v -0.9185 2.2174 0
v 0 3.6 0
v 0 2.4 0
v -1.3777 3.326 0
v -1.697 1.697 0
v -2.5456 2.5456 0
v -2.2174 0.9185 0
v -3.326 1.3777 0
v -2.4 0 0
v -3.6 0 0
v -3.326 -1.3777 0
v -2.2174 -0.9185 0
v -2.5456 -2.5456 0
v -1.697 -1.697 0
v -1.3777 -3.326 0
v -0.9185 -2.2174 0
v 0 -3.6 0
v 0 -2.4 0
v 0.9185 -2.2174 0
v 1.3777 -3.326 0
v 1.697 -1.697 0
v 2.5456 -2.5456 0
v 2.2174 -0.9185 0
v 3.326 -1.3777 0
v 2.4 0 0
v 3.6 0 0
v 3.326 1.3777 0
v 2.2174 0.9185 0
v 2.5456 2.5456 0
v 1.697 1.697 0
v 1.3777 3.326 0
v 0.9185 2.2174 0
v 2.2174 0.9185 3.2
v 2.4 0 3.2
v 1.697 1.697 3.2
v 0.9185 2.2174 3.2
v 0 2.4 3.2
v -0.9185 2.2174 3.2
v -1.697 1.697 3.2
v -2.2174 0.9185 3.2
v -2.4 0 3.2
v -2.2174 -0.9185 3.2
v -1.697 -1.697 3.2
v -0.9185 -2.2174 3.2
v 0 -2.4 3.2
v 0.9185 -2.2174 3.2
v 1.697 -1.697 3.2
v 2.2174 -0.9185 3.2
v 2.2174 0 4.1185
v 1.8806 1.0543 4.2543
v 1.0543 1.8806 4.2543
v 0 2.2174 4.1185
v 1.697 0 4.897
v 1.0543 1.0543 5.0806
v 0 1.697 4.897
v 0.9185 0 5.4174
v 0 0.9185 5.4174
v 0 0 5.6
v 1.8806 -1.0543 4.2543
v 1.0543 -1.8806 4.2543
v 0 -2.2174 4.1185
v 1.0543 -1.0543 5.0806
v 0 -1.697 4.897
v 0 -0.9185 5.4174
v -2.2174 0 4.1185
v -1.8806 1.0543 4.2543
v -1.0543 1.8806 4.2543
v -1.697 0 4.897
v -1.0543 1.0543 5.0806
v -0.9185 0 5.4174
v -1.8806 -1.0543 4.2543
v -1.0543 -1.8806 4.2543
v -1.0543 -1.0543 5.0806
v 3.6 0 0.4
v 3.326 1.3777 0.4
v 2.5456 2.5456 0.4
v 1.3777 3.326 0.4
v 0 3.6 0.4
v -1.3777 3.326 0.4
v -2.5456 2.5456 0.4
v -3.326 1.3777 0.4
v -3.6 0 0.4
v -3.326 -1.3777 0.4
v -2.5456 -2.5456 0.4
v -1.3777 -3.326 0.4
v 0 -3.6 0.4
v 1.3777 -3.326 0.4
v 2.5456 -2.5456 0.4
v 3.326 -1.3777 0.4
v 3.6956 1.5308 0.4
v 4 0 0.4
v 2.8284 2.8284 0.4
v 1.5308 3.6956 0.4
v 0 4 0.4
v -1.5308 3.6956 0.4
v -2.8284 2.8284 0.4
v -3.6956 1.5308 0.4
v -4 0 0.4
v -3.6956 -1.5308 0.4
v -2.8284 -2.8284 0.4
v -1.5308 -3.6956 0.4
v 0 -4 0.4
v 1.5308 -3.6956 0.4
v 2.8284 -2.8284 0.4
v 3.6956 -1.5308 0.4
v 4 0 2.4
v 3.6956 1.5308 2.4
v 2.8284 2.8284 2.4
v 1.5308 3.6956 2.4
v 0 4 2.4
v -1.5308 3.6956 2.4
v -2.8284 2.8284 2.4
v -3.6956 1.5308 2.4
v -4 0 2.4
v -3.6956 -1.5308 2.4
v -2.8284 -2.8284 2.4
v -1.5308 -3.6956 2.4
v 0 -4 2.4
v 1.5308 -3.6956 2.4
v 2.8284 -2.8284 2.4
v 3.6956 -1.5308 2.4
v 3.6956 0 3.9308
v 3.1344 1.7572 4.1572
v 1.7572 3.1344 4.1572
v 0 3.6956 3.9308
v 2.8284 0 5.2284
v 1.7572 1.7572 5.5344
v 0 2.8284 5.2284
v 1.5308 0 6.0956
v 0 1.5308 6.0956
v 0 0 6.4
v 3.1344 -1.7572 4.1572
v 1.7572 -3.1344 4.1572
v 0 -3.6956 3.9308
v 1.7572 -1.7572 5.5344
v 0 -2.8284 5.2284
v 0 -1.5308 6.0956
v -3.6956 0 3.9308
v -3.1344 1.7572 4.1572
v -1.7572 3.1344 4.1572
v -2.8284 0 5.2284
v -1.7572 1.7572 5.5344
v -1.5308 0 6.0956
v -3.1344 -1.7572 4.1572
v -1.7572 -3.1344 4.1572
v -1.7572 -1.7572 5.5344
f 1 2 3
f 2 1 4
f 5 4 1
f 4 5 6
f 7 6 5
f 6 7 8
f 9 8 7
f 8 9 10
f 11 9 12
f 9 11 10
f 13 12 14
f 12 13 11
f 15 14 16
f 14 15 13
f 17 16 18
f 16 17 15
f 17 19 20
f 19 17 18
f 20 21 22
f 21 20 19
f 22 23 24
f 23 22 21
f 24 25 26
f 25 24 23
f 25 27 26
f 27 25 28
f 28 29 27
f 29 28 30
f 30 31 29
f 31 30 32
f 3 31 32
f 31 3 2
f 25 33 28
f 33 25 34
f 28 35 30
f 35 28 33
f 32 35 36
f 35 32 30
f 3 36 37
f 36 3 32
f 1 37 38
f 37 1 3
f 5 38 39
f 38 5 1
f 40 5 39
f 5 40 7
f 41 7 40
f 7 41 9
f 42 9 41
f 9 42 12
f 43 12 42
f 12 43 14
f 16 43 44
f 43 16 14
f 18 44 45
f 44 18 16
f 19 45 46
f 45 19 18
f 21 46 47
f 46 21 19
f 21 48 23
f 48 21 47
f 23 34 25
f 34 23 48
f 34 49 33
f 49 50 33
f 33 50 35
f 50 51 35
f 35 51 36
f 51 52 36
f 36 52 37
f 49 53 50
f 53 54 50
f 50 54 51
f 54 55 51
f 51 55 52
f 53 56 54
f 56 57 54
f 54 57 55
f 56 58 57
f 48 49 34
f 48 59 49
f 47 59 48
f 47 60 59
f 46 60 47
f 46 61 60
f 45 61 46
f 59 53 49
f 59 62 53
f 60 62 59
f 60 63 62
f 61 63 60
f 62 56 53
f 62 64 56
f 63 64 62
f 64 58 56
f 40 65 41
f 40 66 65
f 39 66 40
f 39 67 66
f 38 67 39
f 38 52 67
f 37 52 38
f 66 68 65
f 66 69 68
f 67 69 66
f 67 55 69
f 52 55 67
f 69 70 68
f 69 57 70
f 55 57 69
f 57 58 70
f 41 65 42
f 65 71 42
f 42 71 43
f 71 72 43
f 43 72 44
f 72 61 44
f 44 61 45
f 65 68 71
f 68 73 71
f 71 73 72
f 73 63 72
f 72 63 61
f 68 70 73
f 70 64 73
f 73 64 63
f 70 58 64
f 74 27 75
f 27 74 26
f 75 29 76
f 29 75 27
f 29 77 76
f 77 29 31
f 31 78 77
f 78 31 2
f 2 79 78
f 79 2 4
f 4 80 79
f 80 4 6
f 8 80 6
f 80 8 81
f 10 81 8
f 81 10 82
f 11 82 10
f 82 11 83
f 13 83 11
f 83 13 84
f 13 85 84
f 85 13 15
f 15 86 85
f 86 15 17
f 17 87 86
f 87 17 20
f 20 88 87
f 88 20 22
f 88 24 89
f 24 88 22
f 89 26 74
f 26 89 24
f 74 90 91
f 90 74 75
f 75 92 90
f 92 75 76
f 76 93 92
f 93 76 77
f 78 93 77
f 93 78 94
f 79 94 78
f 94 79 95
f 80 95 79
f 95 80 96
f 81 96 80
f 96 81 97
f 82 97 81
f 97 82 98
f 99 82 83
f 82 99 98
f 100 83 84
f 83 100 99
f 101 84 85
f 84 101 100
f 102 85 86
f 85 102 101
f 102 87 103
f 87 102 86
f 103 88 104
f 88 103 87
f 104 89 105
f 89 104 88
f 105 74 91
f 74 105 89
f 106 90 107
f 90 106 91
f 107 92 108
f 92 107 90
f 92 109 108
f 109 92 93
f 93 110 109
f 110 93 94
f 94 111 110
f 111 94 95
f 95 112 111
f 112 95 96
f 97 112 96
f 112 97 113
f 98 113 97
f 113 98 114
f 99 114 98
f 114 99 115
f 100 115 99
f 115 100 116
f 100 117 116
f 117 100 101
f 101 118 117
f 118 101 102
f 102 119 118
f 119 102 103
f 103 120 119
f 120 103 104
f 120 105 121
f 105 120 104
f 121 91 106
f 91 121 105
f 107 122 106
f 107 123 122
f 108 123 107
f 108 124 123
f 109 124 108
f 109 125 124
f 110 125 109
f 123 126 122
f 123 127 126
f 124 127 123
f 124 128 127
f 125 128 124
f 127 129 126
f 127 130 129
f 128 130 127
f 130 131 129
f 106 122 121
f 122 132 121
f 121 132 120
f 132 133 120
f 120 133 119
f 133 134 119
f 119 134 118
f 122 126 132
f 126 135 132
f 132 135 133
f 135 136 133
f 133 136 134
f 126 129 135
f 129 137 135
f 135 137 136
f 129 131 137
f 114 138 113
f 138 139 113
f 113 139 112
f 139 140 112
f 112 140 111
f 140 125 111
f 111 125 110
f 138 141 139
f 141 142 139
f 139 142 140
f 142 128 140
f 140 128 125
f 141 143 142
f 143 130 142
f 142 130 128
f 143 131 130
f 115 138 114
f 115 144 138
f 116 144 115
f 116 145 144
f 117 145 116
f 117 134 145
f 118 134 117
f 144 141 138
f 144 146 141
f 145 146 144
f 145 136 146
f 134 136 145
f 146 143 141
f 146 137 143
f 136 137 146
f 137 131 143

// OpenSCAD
// file: ../p/1-8sphe.scad
use <../lib.scad>
function ldraw_lib__1_8sphe() = [
// 0 Sphere 0.125
// 0 Name: 1-8sphe.dat
// 0 Author: James Jessiman
// 0 !LDRAW_ORG Primitive UPDATE 2012-03
// 0 !LICENSE Licensed under CC BY 4.0 : see CAreadme.txt
// 
// 0 BFC CERTIFY CCW
  [0,"BFC","CERTIFY"],
  [0,"BFC","CCW"],
// 
// 0 !HISTORY 2000-08-01 {Axel Poque} fixes to resolve L3P error messages.
// 0 !HISTORY 2000-08-01 {Manfred Moolhuysen} fixes to resolve L3P error messages.
// 0 !HISTORY 2000-09-30 [PTadmin] Official Update 2000-02
// 0 !HISTORY 2002-03-28 [hafhead] Made BFC compliant
// 0 !HISTORY 2002-04-25 [PTadmin] Official Update 2002-02
// 0 !HISTORY 2007-06-22 [PTadmin] Header formatted for Contributor Agreement
// 0 !HISTORY 2008-07-01 [PTadmin] Official Update 2008-01
// 0 !HISTORY 2010-09-12 [MagFors] Changed winding, removed duplicated cond-line, optimized filesize
// 0 !HISTORY 2010-12-31 [PTadmin] Official Update 2010-03
// 0 !HISTORY 2012-07-01 [tcobbs] Replaced with geometry from LDView
// 0 !HISTORY 2012-12-28 [PTadmin] Official Update 2012-03
// 
// 
// 3 16 1 0 0 0.9239 0.3827 0 0.9239 0 0.3827
  [3,16,1,0,0,0.9239,0.3827,0,0.9239,0,0.3827],
// 3 16 0.9239 0.3827 0 0.7836 0.4393 0.4393 0.9239 0 0.3827
  [3,16,0.9239,0.3827,0,0.7836,0.4393,0.4393,0.9239,0,0.3827],
// 3 16 0.9239 0 0.3827 0.7836 0.4393 0.4393 0.7071 0 0.7071
  [3,16,0.9239,0,0.3827,0.7836,0.4393,0.4393,0.7071,0,0.7071],
// 3 16 0.7836 0.4393 0.4393 0.4393 0.4393 0.7836 0.7071 0 0.7071
  [3,16,0.7836,0.4393,0.4393,0.4393,0.4393,0.7836,0.7071,0,0.7071],
// 3 16 0.7071 0 0.7071 0.4393 0.4393 0.7836 0.3827 0 0.9239
  [3,16,0.7071,0,0.7071,0.4393,0.4393,0.7836,0.3827,0,0.9239],
// 3 16 0.4393 0.4393 0.7836 0 0.3827 0.9239 0.3827 0 0.9239
  [3,16,0.4393,0.4393,0.7836,0,0.3827,0.9239,0.3827,0,0.9239],
// 3 16 0.3827 0 0.9239 0 0.3827 0.9239 0 0 1
  [3,16,0.3827,0,0.9239,0,0.3827,0.9239,0,0,1],
// 3 16 0.9239 0.3827 0 0.7071 0.7071 0 0.7836 0.4393 0.4393
  [3,16,0.9239,0.3827,0,0.7071,0.7071,0,0.7836,0.4393,0.4393],
// 3 16 0.7071 0.7071 0 0.4393 0.7836 0.4393 0.7836 0.4393 0.4393
  [3,16,0.7071,0.7071,0,0.4393,0.7836,0.4393,0.7836,0.4393,0.4393],
// 3 16 0.7836 0.4393 0.4393 0.4393 0.7836 0.4393 0.4393 0.4393 0.7836
  [3,16,0.7836,0.4393,0.4393,0.4393,0.7836,0.4393,0.4393,0.4393,0.7836],
// 3 16 0.4393 0.7836 0.4393 0 0.7071 0.7071 0.4393 0.4393 0.7836
  [3,16,0.4393,0.7836,0.4393,0,0.7071,0.7071,0.4393,0.4393,0.7836],
// 3 16 0.4393 0.4393 0.7836 0 0.7071 0.7071 0 0.3827 0.9239
  [3,16,0.4393,0.4393,0.7836,0,0.7071,0.7071,0,0.3827,0.9239],
// 3 16 0.7071 0.7071 0 0.3827 0.9239 0 0.4393 0.7836 0.4393
  [3,16,0.7071,0.7071,0,0.3827,0.9239,0,0.4393,0.7836,0.4393],
// 3 16 0.3827 0.9239 0 0 0.9239 0.3827 0.4393 0.7836 0.4393
  [3,16,0.3827,0.9239,0,0,0.9239,0.3827,0.4393,0.7836,0.4393],
// 3 16 0.4393 0.7836 0.4393 0 0.9239 0.3827 0 0.7071 0.7071
  [3,16,0.4393,0.7836,0.4393,0,0.9239,0.3827,0,0.7071,0.7071],
// 3 16 0.3827 0.9239 0 0 1 0 0 0.9239 0.3827
  [3,16,0.3827,0.9239,0,0,1,0,0,0.9239,0.3827],
// 
// 5 24 1 0 0 0.9239 0.3827 0 1 0 -0.1 0.9239 0 0.3827
  [5,24,1,0,0,0.9239,0.3827,0,1,0,-0.1,0.9239,0,0.3827],
// 5 24 0.9239 0.3827 0 0.9239 0 0.3827 1 0 0 0.7836 0.4393 0.4393
  [5,24,0.9239,0.3827,0,0.9239,0,0.3827,1,0,0,0.7836,0.4393,0.4393],
// 5 24 1 0 0 0.9239 0 0.3827 0.9239 0.3827 0 1 -0.1 0
  [5,24,1,0,0,0.9239,0,0.3827,0.9239,0.3827,0,1,-0.1,0],
// 5 24 0.9239 0 0.3827 0.7836 0.4393 0.4393 0.9239 0.3827 0 0.7071 0 0.7071
  [5,24,0.9239,0,0.3827,0.7836,0.4393,0.4393,0.9239,0.3827,0,0.7071,0,0.7071],
// 5 24 0.7836 0.4393 0.4393 0.7071 0 0.7071 0.9239 0 0.3827 0.4393 0.4393 0.7836
  [5,24,0.7836,0.4393,0.4393,0.7071,0,0.7071,0.9239,0,0.3827,0.4393,0.4393,0.7836],
// 5 24 0.9239 0 0.3827 0.7071 0 0.7071 0.7836 0.4393 0.4393 0.9239 -0.1 0.3827
  [5,24,0.9239,0,0.3827,0.7071,0,0.7071,0.7836,0.4393,0.4393,0.9239,-0.1,0.3827],
// 5 24 0.7071 0 0.7071 0.4393 0.4393 0.7836 0.7836 0.4393 0.4393 0.3827 0 0.9239
  [5,24,0.7071,0,0.7071,0.4393,0.4393,0.7836,0.7836,0.4393,0.4393,0.3827,0,0.9239],
// 5 24 0.4393 0.4393 0.7836 0.3827 0 0.9239 0.7071 0 0.7071 0 0.3827 0.9239
  [5,24,0.4393,0.4393,0.7836,0.3827,0,0.9239,0.7071,0,0.7071,0,0.3827,0.9239],
// 5 24 0.7071 0 0.7071 0.3827 0 0.9239 0.4393 0.4393 0.7836 0.7071 -0.1 0.7071
  [5,24,0.7071,0,0.7071,0.3827,0,0.9239,0.4393,0.4393,0.7836,0.7071,-0.1,0.7071],
// 5 24 0.3827 0 0.9239 0 0.3827 0.9239 0.4393 0.4393 0.7836 0 0 1
  [5,24,0.3827,0,0.9239,0,0.3827,0.9239,0.4393,0.4393,0.7836,0,0,1],
// 5 24 0 0.3827 0.9239 0 0 1 0.3827 0 0.9239 -0.1 0.3827 0.9239
  [5,24,0,0.3827,0.9239,0,0,1,0.3827,0,0.9239,-0.1,0.3827,0.9239],
// 5 24 0.3827 0 0.9239 0 0 1 0 0.3827 0.9239 0.3827 -0.1 0.9239
  [5,24,0.3827,0,0.9239,0,0,1,0,0.3827,0.9239,0.3827,-0.1,0.9239],
// 5 24 0.9239 0.3827 0 0.7071 0.7071 0 0.9239 0.3827 -0.1 0.7836 0.4393 0.4393
  [5,24,0.9239,0.3827,0,0.7071,0.7071,0,0.9239,0.3827,-0.1,0.7836,0.4393,0.4393],
// 5 24 0.7071 0.7071 0 0.7836 0.4393 0.4393 0.9239 0.3827 0 0.4393 0.7836 0.4393
  [5,24,0.7071,0.7071,0,0.7836,0.4393,0.4393,0.9239,0.3827,0,0.4393,0.7836,0.4393],
// 5 24 0.9239 0.3827 0 0.7836 0.4393 0.4393 0.7071 0.7071 0 0.9239 0 0.3827
  [5,24,0.9239,0.3827,0,0.7836,0.4393,0.4393,0.7071,0.7071,0,0.9239,0,0.3827],
// 5 24 0.7836 0.4393 0.4393 0.4393 0.7836 0.4393 0.7071 0.7071 0 0.4393 0.4393 0.7836
  [5,24,0.7836,0.4393,0.4393,0.4393,0.7836,0.4393,0.7071,0.7071,0,0.4393,0.4393,0.7836],
// 5 24 0.4393 0.7836 0.4393 0.4393 0.4393 0.7836 0.7836 0.4393 0.4393 0 0.7071 0.7071
  [5,24,0.4393,0.7836,0.4393,0.4393,0.4393,0.7836,0.7836,0.4393,0.4393,0,0.7071,0.7071],
// 5 24 0.7836 0.4393 0.4393 0.4393 0.4393 0.7836 0.4393 0.7836 0.4393 0.7071 0 0.7071
  [5,24,0.7836,0.4393,0.4393,0.4393,0.4393,0.7836,0.4393,0.7836,0.4393,0.7071,0,0.7071],
// 5 24 0.4393 0.4393 0.7836 0 0.7071 0.7071 0.4393 0.7836 0.4393 0 0.3827 0.9239
  [5,24,0.4393,0.4393,0.7836,0,0.7071,0.7071,0.4393,0.7836,0.4393,0,0.3827,0.9239],
// 5 24 0 0.7071 0.7071 0 0.3827 0.9239 0.4393 0.4393 0.7836 -0.1 0.7071 0.7071
  [5,24,0,0.7071,0.7071,0,0.3827,0.9239,0.4393,0.4393,0.7836,-0.1,0.7071,0.7071],
// 5 24 0.4393 0.4393 0.7836 0 0.3827 0.9239 0 0.7071 0.7071 0.3827 0 0.9239
  [5,24,0.4393,0.4393,0.7836,0,0.3827,0.9239,0,0.7071,0.7071,0.3827,0,0.9239],
// 5 24 0.7071 0.7071 0 0.3827 0.9239 0 0.7071 0.7071 -0.1 0.4393 0.7836 0.4393
  [5,24,0.7071,0.7071,0,0.3827,0.9239,0,0.7071,0.7071,-0.1,0.4393,0.7836,0.4393],
// 5 24 0.3827 0.9239 0 0.4393 0.7836 0.4393 0.7071 0.7071 0 0 0.9239 0.3827
  [5,24,0.3827,0.9239,0,0.4393,0.7836,0.4393,0.7071,0.7071,0,0,0.9239,0.3827],
// 5 24 0.7071 0.7071 0 0.4393 0.7836 0.4393 0.3827 0.9239 0 0.7836 0.4393 0.4393
  [5,24,0.7071,0.7071,0,0.4393,0.7836,0.4393,0.3827,0.9239,0,0.7836,0.4393,0.4393],
// 5 24 0.4393 0.7836 0.4393 0 0.9239 0.3827 0.3827 0.9239 0 0 0.7071 0.7071
  [5,24,0.4393,0.7836,0.4393,0,0.9239,0.3827,0.3827,0.9239,0,0,0.7071,0.7071],
// 5 24 0 0.9239 0.3827 0 0.7071 0.7071 0.4393 0.7836 0.4393 -0.1 0.9239 0.3827
  [5,24,0,0.9239,0.3827,0,0.7071,0.7071,0.4393,0.7836,0.4393,-0.1,0.9239,0.3827],
// 5 24 0.4393 0.7836 0.4393 0 0.7071 0.7071 0 0.9239 0.3827 0.4393 0.4393 0.7836
  [5,24,0.4393,0.7836,0.4393,0,0.7071,0.7071,0,0.9239,0.3827,0.4393,0.4393,0.7836],
// 5 24 0.3827 0.9239 0 0 1 0 0.3827 0.9239 -0.1 0 0.9239 0.3827
  [5,24,0.3827,0.9239,0,0,1,0,0.3827,0.9239,-0.1,0,0.9239,0.3827],
// 5 24 0 1 0 0 0.9239 0.3827 0.3827 0.9239 0 -0.1 1 0
  [5,24,0,1,0,0,0.9239,0.3827,0.3827,0.9239,0,-0.1,1,0],
// 5 24 0.3827 0.9239 0 0 0.9239 0.3827 0 1 0 0.4393 0.7836 0.4393
  [5,24,0.3827,0.9239,0,0,0.9239,0.3827,0,1,0,0.4393,0.7836,0.4393],
];
module ldraw_lib__1_8sphe(step=0, col=false, unit=2/5, alt=false, line=0.2, solid=!$preview)
    makepoly(ldraw_lib__1_8sphe(), step=step, col=col, unit=unit, alt=alt, line=line, solid=solid);
ldraw_lib__1_8sphe(line=0.2);
// file: ../p/4-8sphe.scad
use <../lib.scad>
use <1-8sphe.scad>
function ldraw_lib__4_8sphe() = [
// 0 Sphere 0.5
// 0 Name: 4-8sphe.dat
// 0 Author: James Jessiman
// 0 !LDRAW_ORG Primitive UPDATE 2003-02
// 0 !LICENSE Licensed under CC BY 4.0 : see CAreadme.txt
// 
// 0 BFC CERTIFY CCW
  [0,"BFC","CERTIFY"],
  [0,"BFC","CCW"],
// 
// 0 !HISTORY 2002-08-31 [izanette] Modified with WINDZ for BFC compliance
// 0 !HISTORY 2003-08-01 [PTadmin] Official Update 2003-02
// 0 !HISTORY 2007-06-24 [PTadmin] Header formatted for Contributor Agreement
// 0 !HISTORY 2008-07-01 [PTadmin] Official Update 2008-01
// 
// 
// 1 16 0 0 0 1 0 0 0 1 0 0 0 1 1-8sphe.dat
  [1,16,0,0,0,1,0,0,0,1,0,0,0,1, ldraw_lib__1_8sphe()],
// 1 16 0 0 0 1 0 0 0 1 0 0 0 -1 1-8sphe.dat
  [1,16,0,0,0,1,0,0,0,1,0,0,0,-1, ldraw_lib__1_8sphe()],
// 1 16 0 0 0 -1 0 0 0 1 0 0 0 1 1-8sphe.dat
  [1,16,0,0,0,-1,0,0,0,1,0,0,0,1, ldraw_lib__1_8sphe()],
// 1 16 0 0 0 -1 0 0 0 1 0 0 0 -1 1-8sphe.dat
  [1,16,0,0,0,-1,0,0,0,1,0,0,0,-1, ldraw_lib__1_8sphe()],
// 0
// 
];
module ldraw_lib__4_8sphe(step=0, col=false, unit=2/5, alt=false, line=0.2, solid=!$preview)
    makepoly(ldraw_lib__4_8sphe(), step=step, col=col, unit=unit, alt=alt, line=line, solid=solid);
ldraw_lib__4_8sphe(line=0.2);
// file: ../p/4-4ring9.scad
use <../lib.scad>
function ldraw_lib__4_4ring9() = [
// 0 Ring  9 x 1.0
// 0 Name: 4-4ring9.dat
// 0 Author: Magnus Forsberg [MagFors]
// 0 !LDRAW_ORG Primitive UPDATE 2024-01
// 0 !LICENSE Licensed under CC BY 4.0 : see CAreadme.txt
// 
// 0 BFC CERTIFY CCW
  [0,"BFC","CERTIFY"],
  [0,"BFC","CCW"],
// 
// 0 !HISTORY 2004-04-22 [PTadmin] Official Update 2004-02
// 0 !HISTORY 2007-06-24 [PTadmin] Header formatted for Contributor Agreement
// 0 !HISTORY 2008-07-01 [PTadmin] Official Update 2008-01
// 0 !HISTORY 2024-01-04 [MagFors] Complete regeneration, original by jriley
// 0 !HISTORY 2024-01-29 [OrionP] Official Update 2024-01
// 
// 4 16 10 0 0 9.239 0 3.827 8.3151 0 3.4443 9 0 0
  [4,16,10,0,0,9.239,0,3.827,8.3151,0,3.4443,9,0,0],
// 4 16 9.239 0 3.827 7.071 0 7.071 6.3639 0 6.3639 8.3151 0 3.4443
  [4,16,9.239,0,3.827,7.071,0,7.071,6.3639,0,6.3639,8.3151,0,3.4443],
// 4 16 7.071 0 7.071 3.827 0 9.239 3.4443 0 8.3151 6.3639 0 6.3639
  [4,16,7.071,0,7.071,3.827,0,9.239,3.4443,0,8.3151,6.3639,0,6.3639],
// 4 16 3.827 0 9.239 0 0 10 0 0 9 3.4443 0 8.3151
  [4,16,3.827,0,9.239,0,0,10,0,0,9,3.4443,0,8.3151],
// 4 16 0 0 10 -3.827 0 9.239 -3.4443 0 8.3151 0 0 9
  [4,16,0,0,10,-3.827,0,9.239,-3.4443,0,8.3151,0,0,9],
// 4 16 -3.827 0 9.239 -7.071 0 7.071 -6.3639 0 6.3639 -3.4443 0 8.3151
  [4,16,-3.827,0,9.239,-7.071,0,7.071,-6.3639,0,6.3639,-3.4443,0,8.3151],
// 4 16 -7.071 0 7.071 -9.239 0 3.827 -8.3151 0 3.4443 -6.3639 0 6.3639
  [4,16,-7.071,0,7.071,-9.239,0,3.827,-8.3151,0,3.4443,-6.3639,0,6.3639],
// 4 16 -9.239 0 3.827 -10 0 0 -9 0 0 -8.3151 0 3.4443
  [4,16,-9.239,0,3.827,-10,0,0,-9,0,0,-8.3151,0,3.4443],
// 4 16 -10 0 0 -9.239 0 -3.827 -8.3151 0 -3.4443 -9 0 0
  [4,16,-10,0,0,-9.239,0,-3.827,-8.3151,0,-3.4443,-9,0,0],
// 4 16 -9.239 0 -3.827 -7.071 0 -7.071 -6.3639 0 -6.3639 -8.3151 0 -3.4443
  [4,16,-9.239,0,-3.827,-7.071,0,-7.071,-6.3639,0,-6.3639,-8.3151,0,-3.4443],
// 4 16 -7.071 0 -7.071 -3.827 0 -9.239 -3.4443 0 -8.3151 -6.3639 0 -6.3639
  [4,16,-7.071,0,-7.071,-3.827,0,-9.239,-3.4443,0,-8.3151,-6.3639,0,-6.3639],
// 4 16 -3.827 0 -9.239 0 0 -10 0 0 -9 -3.4443 0 -8.3151
  [4,16,-3.827,0,-9.239,0,0,-10,0,0,-9,-3.4443,0,-8.3151],
// 4 16 0 0 -10 3.827 0 -9.239 3.4443 0 -8.3151 0 0 -9
  [4,16,0,0,-10,3.827,0,-9.239,3.4443,0,-8.3151,0,0,-9],
// 4 16 3.827 0 -9.239 7.071 0 -7.071 6.3639 0 -6.3639 3.4443 0 -8.3151
  [4,16,3.827,0,-9.239,7.071,0,-7.071,6.3639,0,-6.3639,3.4443,0,-8.3151],
// 4 16 7.071 0 -7.071 9.239 0 -3.827 8.3151 0 -3.4443 6.3639 0 -6.3639
  [4,16,7.071,0,-7.071,9.239,0,-3.827,8.3151,0,-3.4443,6.3639,0,-6.3639],
// 4 16 9.239 0 -3.827 10 0 0 9 0 0 8.3151 0 -3.4443
  [4,16,9.239,0,-3.827,10,0,0,9,0,0,8.3151,0,-3.4443],
// 0 // Build by LDPartEditor (PrimGen 2.X)
];
module ldraw_lib__4_4ring9(step=0, col=false, unit=2/5, alt=false, line=0.2, solid=!$preview)
    makepoly(ldraw_lib__4_4ring9(), step=step, col=col, unit=unit, alt=alt, line=line, solid=solid);
ldraw_lib__4_4ring9(line=0.2);
// file: ../p/4-4ring2.scad
use <../lib.scad>
function ldraw_lib__4_4ring2() = [
// 0 Ring  2 x 1.0
// 0 Name: 4-4ring2.dat
// 0 Author: James Jessiman
// 0 !LDRAW_ORG Primitive UPDATE 2009-01
// 0 !LICENSE Licensed under CC BY 4.0 : see CAreadme.txt
// 
// 0 BFC CERTIFY CCW
  [0,"BFC","CERTIFY"],
  [0,"BFC","CCW"],
// 
// 0 !HISTORY 1998-12-15 [PTadmin] Official Update 1998-10
// 0 !HISTORY 2002-04-05 [hafhead] Added BFC statement
// 0 !HISTORY 2002-04-25 [PTadmin] Official Update 2002-02
// 0 !HISTORY 2007-06-24 [PTadmin] Header formatted for Contributor Agreement
// 0 !HISTORY 2008-07-01 [PTadmin] Official Update 2008-01
// 0 !HISTORY 2008-08-26 [cwdee] Switch polygon winding and rename
// 0 !HISTORY 2009-05-02 [PTadmin] Official Update 2009-01
// 
// 
// 4 16 -1.1481 0 2.7717 -0.7654 0 1.8478 0 0 2 0 0 3
  [4,16,-1.1481,0,2.7717,-0.7654,0,1.8478,0,0,2,0,0,3],
// 4 16 -2.1213 0 2.1213 -1.4142 0 1.4142 -0.7654 0 1.8478 -1.1481 0 2.7717
  [4,16,-2.1213,0,2.1213,-1.4142,0,1.4142,-0.7654,0,1.8478,-1.1481,0,2.7717],
// 4 16 -2.7717 0 1.1481 -1.8478 0 0.7654 -1.4142 0 1.4142 -2.1213 0 2.1213
  [4,16,-2.7717,0,1.1481,-1.8478,0,0.7654,-1.4142,0,1.4142,-2.1213,0,2.1213],
// 4 16 -3 0 0 -2 0 0 -1.8478 0 0.7654 -2.7717 0 1.1481
  [4,16,-3,0,0,-2,0,0,-1.8478,0,0.7654,-2.7717,0,1.1481],
// 4 16 -2.7717 0 -1.1481 -1.8478 0 -0.7654 -2 0 0 -3 0 0
  [4,16,-2.7717,0,-1.1481,-1.8478,0,-0.7654,-2,0,0,-3,0,0],
// 4 16 -2.1213 0 -2.1213 -1.4142 0 -1.4142 -1.8478 0 -0.7654 -2.7717 0 -1.1481
  [4,16,-2.1213,0,-2.1213,-1.4142,0,-1.4142,-1.8478,0,-0.7654,-2.7717,0,-1.1481],
// 4 16 -1.1481 0 -2.7717 -0.7654 0 -1.8478 -1.4142 0 -1.4142 -2.1213 0 -2.1213
  [4,16,-1.1481,0,-2.7717,-0.7654,0,-1.8478,-1.4142,0,-1.4142,-2.1213,0,-2.1213],
// 4 16 0 0 -3 0 0 -2 -0.7654 0 -1.8478 -1.1481 0 -2.7717
  [4,16,0,0,-3,0,0,-2,-0.7654,0,-1.8478,-1.1481,0,-2.7717],
// 4 16 1.1481 0 -2.7717 0.7654 0 -1.8478 0 0 -2 0 0 -3
  [4,16,1.1481,0,-2.7717,0.7654,0,-1.8478,0,0,-2,0,0,-3],
// 4 16 2.1213 0 -2.1213 1.4142 0 -1.4142 0.7654 0 -1.8478 1.1481 0 -2.7717
  [4,16,2.1213,0,-2.1213,1.4142,0,-1.4142,0.7654,0,-1.8478,1.1481,0,-2.7717],
// 4 16 2.7717 0 -1.1481 1.8478 0 -0.7654 1.4142 0 -1.4142 2.1213 0 -2.1213
  [4,16,2.7717,0,-1.1481,1.8478,0,-0.7654,1.4142,0,-1.4142,2.1213,0,-2.1213],
// 4 16 3 0 0 2 0 0 1.8478 0 -0.7654 2.7717 0 -1.1481
  [4,16,3,0,0,2,0,0,1.8478,0,-0.7654,2.7717,0,-1.1481],
// 4 16 2.7717 0 1.1481 1.8478 0 0.7654 2 0 0 3 0 0
  [4,16,2.7717,0,1.1481,1.8478,0,0.7654,2,0,0,3,0,0],
// 4 16 2.1213 0 2.1213 1.4142 0 1.4142 1.8478 0 0.7654 2.7717 0 1.1481
  [4,16,2.1213,0,2.1213,1.4142,0,1.4142,1.8478,0,0.7654,2.7717,0,1.1481],
// 4 16 1.1481 0 2.7717 0.7654 0 1.8478 1.4142 0 1.4142 2.1213 0 2.1213
  [4,16,1.1481,0,2.7717,0.7654,0,1.8478,1.4142,0,1.4142,2.1213,0,2.1213],
// 4 16 0 0 3 0 0 2 0.7654 0 1.8478 1.1481 0 2.7717
  [4,16,0,0,3,0,0,2,0.7654,0,1.8478,1.1481,0,2.7717],
// 0
];
module ldraw_lib__4_4ring2(step=0, col=false, unit=2/5, alt=false, line=0.2, solid=!$preview)
    makepoly(ldraw_lib__4_4ring2(), step=step, col=col, unit=unit, alt=alt, line=line, solid=solid);
ldraw_lib__4_4ring2(line=0.2);
// file: ../p/4-4edge.scad
use <../lib.scad>
function ldraw_lib__4_4edge() = [
// 0 Circle 1.0
// 0 Name: 4-4edge.dat
// 0 Author: James Jessiman
// 0 !LDRAW_ORG Primitive UPDATE 2017-01
// 0 !LICENSE Licensed under CC BY 4.0 : see CAreadme.txt
// 
// 0 BFC CERTIFY CCW
  [0,"BFC","CERTIFY"],
  [0,"BFC","CCW"],
// 
// 0 !HISTORY 1998-12-15 [PTadmin] Official Update 1998-10
// 0 !HISTORY 2005-12-28 [PTadmin] Official Update 2005-01
// 0 !HISTORY 2007-06-24 [PTadmin] Header formatted for Contributor Agreement
// 0 !HISTORY 2008-07-01 [PTadmin] Official Update 2008-01
// 0 !HISTORY 2017-01-15 [Steffen] BFCed
// 0 !HISTORY 2017-12-30 [PTadmin] Official Update 2017-01
// 
// 
// 2 24 1 0 0 0.9239 0 0.3827
  [2,24,1,0,0,0.9239,0,0.3827],
// 2 24 0.9239 0 0.3827 0.7071 0 0.7071
  [2,24,0.9239,0,0.3827,0.7071,0,0.7071],
// 2 24 0.7071 0 0.7071 0.3827 0 0.9239
  [2,24,0.7071,0,0.7071,0.3827,0,0.9239],
// 2 24 0.3827 0 0.9239 0 0 1
  [2,24,0.3827,0,0.9239,0,0,1],
// 2 24 0 0 1 -0.3827 0 0.9239
  [2,24,0,0,1,-0.3827,0,0.9239],
// 2 24 -0.3827 0 0.9239 -0.7071 0 0.7071
  [2,24,-0.3827,0,0.9239,-0.7071,0,0.7071],
// 2 24 -0.7071 0 0.7071 -0.9239 0 0.3827
  [2,24,-0.7071,0,0.7071,-0.9239,0,0.3827],
// 2 24 -0.9239 0 0.3827 -1 0 -0
  [2,24,-0.9239,0,0.3827,-1,0,-0],
// 2 24 -1 0 -0 -0.9239 0 -0.3827
  [2,24,-1,0,-0,-0.9239,0,-0.3827],
// 2 24 -0.9239 0 -0.3827 -0.7071 0 -0.7071
  [2,24,-0.9239,0,-0.3827,-0.7071,0,-0.7071],
// 2 24 -0.7071 0 -0.7071 -0.3827 0 -0.9239
  [2,24,-0.7071,0,-0.7071,-0.3827,0,-0.9239],
// 2 24 -0.3827 0 -0.9239 0 0 -1
  [2,24,-0.3827,0,-0.9239,0,0,-1],
// 2 24 0 0 -1 0.3827 0 -0.9239
  [2,24,0,0,-1,0.3827,0,-0.9239],
// 2 24 0.3827 0 -0.9239 0.7071 0 -0.7071
  [2,24,0.3827,0,-0.9239,0.7071,0,-0.7071],
// 2 24 0.7071 0 -0.7071 0.9239 0 -0.3827
  [2,24,0.7071,0,-0.7071,0.9239,0,-0.3827],
// 2 24 0.9239 0 -0.3827 1 0 0
  [2,24,0.9239,0,-0.3827,1,0,0],
];
module ldraw_lib__4_4edge(step=0, col=false, unit=2/5, alt=false, line=0.2, solid=!$preview)
    makepoly(ldraw_lib__4_4edge(), step=step, col=col, unit=unit, alt=alt, line=line, solid=solid);
ldraw_lib__4_4edge(line=0.2);
// file: ../p/4-4cylo.scad
use <../lib.scad>
use <4-4cyli.scad>
use <4-4edge.scad>
function ldraw_lib__4_4cylo() = [
// 0 Cylinder Open 1.0
// 0 Name: 4-4cylo.dat
// 0 Author: Mark Kennedy [mkennedy]
// 0 !LDRAW_ORG Primitive UPDATE 2010-01
// 0 !LICENSE Licensed under CC BY 4.0 : see CAreadme.txt
// 
// 0 BFC CERTIFY CCW
  [0,"BFC","CERTIFY"],
  [0,"BFC","CCW"],
// 
// 0 !HISTORY 2010-04-05 [PTadmin] Official Update 2010-01
// 
// 
// 1 16 0 0 0 1 0 0 0 1 0 0 0 1 4-4edge.dat
  [1,16,0,0,0,1,0,0,0,1,0,0,0,1, ldraw_lib__4_4edge()],
// 1 16 0 1 0 1 0 0 0 1 0 0 0 1 4-4edge.dat
  [1,16,0,1,0,1,0,0,0,1,0,0,0,1, ldraw_lib__4_4edge()],
// 1 16 0 0 0 1 0 0 0 1 0 0 0 1 4-4cyli.dat
  [1,16,0,0,0,1,0,0,0,1,0,0,0,1, ldraw_lib__4_4cyli()],
// 0
];
module ldraw_lib__4_4cylo(step=0, col=false, unit=2/5, alt=false, line=0.2, solid=!$preview)
    makepoly(ldraw_lib__4_4cylo(), step=step, col=col, unit=unit, alt=alt, line=line, solid=solid);
ldraw_lib__4_4cylo(line=0.2);
// file: ../p/4-4cyli.scad
use <../lib.scad>
function ldraw_lib__4_4cyli() = [
// 0 Cylinder 1.0
// 0 Name: 4-4cyli.dat
// 0 Author: James Jessiman
// 0 !LDRAW_ORG Primitive UPDATE 2005-01
// 0 !LICENSE Licensed under CC BY 4.0 : see CAreadme.txt
// 
// 0 BFC CERTIFY CCW
  [0,"BFC","CERTIFY"],
  [0,"BFC","CCW"],
// 
// 0 !HISTORY 1998-12-15 [PTadmin] Official Update 1998-10
// 0 !HISTORY 2002-03-23 [sbliss] Added BFC statement; merged headers from files in distributions LDraw 0.27 and Complete.
// 0 !HISTORY 2002-04-25 [PTadmin] Official Update 2002-02
// 0 !HISTORY 2004-12-14 [guyvivan] BFC CCW
// 0 !HISTORY 2005-12-28 [PTadmin] Official Update 2005-01
// 0 !HISTORY 2007-06-24 [PTadmin] Header formatted for Contributor Agreement
// 0 !HISTORY 2008-07-01 [PTadmin] Official Update 2008-01
// 
// 
// 4 16 1 1 0 0.9239 1 0.3827 0.9239 0 0.3827 1 0 0
  [4,16,1,1,0,0.9239,1,0.3827,0.9239,0,0.3827,1,0,0],
// 5 24 1 0 0 1 1 0 0.9239 0 0.3827 0.9239 0 -0.3827
  [5,24,1,0,0,1,1,0,0.9239,0,0.3827,0.9239,0,-0.3827],
// 4 16 0.9239 1 0.3827 0.7071 1 0.7071 0.7071 0 0.7071 0.9239 0 0.3827
  [4,16,0.9239,1,0.3827,0.7071,1,0.7071,0.7071,0,0.7071,0.9239,0,0.3827],
// 5 24 0.9239 0 0.3827 0.9239 1 0.3827 0.7071 0 0.7071 1 0 0
  [5,24,0.9239,0,0.3827,0.9239,1,0.3827,0.7071,0,0.7071,1,0,0],
// 4 16 0.7071 1 0.7071 0.3827 1 0.9239 0.3827 0 0.9239 0.7071 0 0.7071
  [4,16,0.7071,1,0.7071,0.3827,1,0.9239,0.3827,0,0.9239,0.7071,0,0.7071],
// 5 24 0.7071 0 0.7071 0.7071 1 0.7071 0.3827 0 0.9239 0.9239 0 0.3827
  [5,24,0.7071,0,0.7071,0.7071,1,0.7071,0.3827,0,0.9239,0.9239,0,0.3827],
// 4 16 0.3827 1 0.9239 0 1 1 0 0 1 0.3827 0 0.9239
  [4,16,0.3827,1,0.9239,0,1,1,0,0,1,0.3827,0,0.9239],
// 5 24 0.3827 0 0.9239 0.3827 1 0.9239 0 0 1 0.7071 0 0.7071
  [5,24,0.3827,0,0.9239,0.3827,1,0.9239,0,0,1,0.7071,0,0.7071],
// 4 16 0 1 1 -0.3827 1 0.9239 -0.3827 0 0.9239 0 0 1
  [4,16,0,1,1,-0.3827,1,0.9239,-0.3827,0,0.9239,0,0,1],
// 5 24 0 0 1 0 1 1 -0.3827 0 0.9239 0.3827 0 0.9239
  [5,24,0,0,1,0,1,1,-0.3827,0,0.9239,0.3827,0,0.9239],
// 4 16 -0.3827 1 0.9239 -0.7071 1 0.7071 -0.7071 0 0.7071 -0.3827 0 0.9239
  [4,16,-0.3827,1,0.9239,-0.7071,1,0.7071,-0.7071,0,0.7071,-0.3827,0,0.9239],
// 5 24 -0.3827 0 0.9239 -0.3827 1 0.9239 -0.7071 0 0.7071 0 0 1
  [5,24,-0.3827,0,0.9239,-0.3827,1,0.9239,-0.7071,0,0.7071,0,0,1],
// 4 16 -0.7071 1 0.7071 -0.9239 1 0.3827 -0.9239 0 0.3827 -0.7071 0 0.7071
  [4,16,-0.7071,1,0.7071,-0.9239,1,0.3827,-0.9239,0,0.3827,-0.7071,0,0.7071],
// 5 24 -0.7071 0 0.7071 -0.7071 1 0.7071 -0.9239 0 0.3827 -0.3827 0 0.9239
  [5,24,-0.7071,0,0.7071,-0.7071,1,0.7071,-0.9239,0,0.3827,-0.3827,0,0.9239],
// 4 16 -0.9239 1 0.3827 -1 1 0 -1 0 0 -0.9239 0 0.3827
  [4,16,-0.9239,1,0.3827,-1,1,0,-1,0,0,-0.9239,0,0.3827],
// 5 24 -0.9239 0 0.3827 -0.9239 1 0.3827 -1 0 0 -0.7071 0 0.7071
  [5,24,-0.9239,0,0.3827,-0.9239,1,0.3827,-1,0,0,-0.7071,0,0.7071],
// 4 16 -1 1 0 -0.9239 1 -0.3827 -0.9239 0 -0.3827 -1 0 0
  [4,16,-1,1,0,-0.9239,1,-0.3827,-0.9239,0,-0.3827,-1,0,0],
// 5 24 -1 0 0 -1 1 0 -0.9239 0 -0.3827 -0.9239 0 0.3827
  [5,24,-1,0,0,-1,1,0,-0.9239,0,-0.3827,-0.9239,0,0.3827],
// 4 16 -0.9239 1 -0.3827 -0.7071 1 -0.7071 -0.7071 0 -0.7071 -0.9239 0 -0.3827
  [4,16,-0.9239,1,-0.3827,-0.7071,1,-0.7071,-0.7071,0,-0.7071,-0.9239,0,-0.3827],
// 5 24 -0.9239 0 -0.3827 -0.9239 1 -0.3827 -0.7071 0 -0.7071 -1 0 0
  [5,24,-0.9239,0,-0.3827,-0.9239,1,-0.3827,-0.7071,0,-0.7071,-1,0,0],
// 4 16 -0.7071 1 -0.7071 -0.3827 1 -0.9239 -0.3827 0 -0.9239 -0.7071 0 -0.7071
  [4,16,-0.7071,1,-0.7071,-0.3827,1,-0.9239,-0.3827,0,-0.9239,-0.7071,0,-0.7071],
// 5 24 -0.7071 0 -0.7071 -0.7071 1 -0.7071 -0.3827 0 -0.9239 -0.9239 0 -0.3827
  [5,24,-0.7071,0,-0.7071,-0.7071,1,-0.7071,-0.3827,0,-0.9239,-0.9239,0,-0.3827],
// 4 16 -0.3827 1 -0.9239 0 1 -1 0 0 -1 -0.3827 0 -0.9239
  [4,16,-0.3827,1,-0.9239,0,1,-1,0,0,-1,-0.3827,0,-0.9239],
// 5 24 -0.3827 0 -0.9239 -0.3827 1 -0.9239 0 0 -1 -0.7071 0 -0.7071
  [5,24,-0.3827,0,-0.9239,-0.3827,1,-0.9239,0,0,-1,-0.7071,0,-0.7071],
// 4 16 0 1 -1 0.3827 1 -0.9239 0.3827 0 -0.9239 0 0 -1
  [4,16,0,1,-1,0.3827,1,-0.9239,0.3827,0,-0.9239,0,0,-1],
// 5 24 0 0 -1 0 1 -1 0.3827 0 -0.9239 -0.3827 0 -0.9239
  [5,24,0,0,-1,0,1,-1,0.3827,0,-0.9239,-0.3827,0,-0.9239],
// 4 16 0.3827 1 -0.9239 0.7071 1 -0.7071 0.7071 0 -0.7071 0.3827 0 -0.9239
  [4,16,0.3827,1,-0.9239,0.7071,1,-0.7071,0.7071,0,-0.7071,0.3827,0,-0.9239],
// 5 24 0.3827 0 -0.9239 0.3827 1 -0.9239 0.7071 0 -0.7071 0 0 -1
  [5,24,0.3827,0,-0.9239,0.3827,1,-0.9239,0.7071,0,-0.7071,0,0,-1],
// 4 16 0.7071 1 -0.7071 0.9239 1 -0.3827 0.9239 0 -0.3827 0.7071 0 -0.7071
  [4,16,0.7071,1,-0.7071,0.9239,1,-0.3827,0.9239,0,-0.3827,0.7071,0,-0.7071],
// 5 24 0.7071 0 -0.7071 0.7071 1 -0.7071 0.9239 0 -0.3827 0.3827 0 -0.9239
  [5,24,0.7071,0,-0.7071,0.7071,1,-0.7071,0.9239,0,-0.3827,0.3827,0,-0.9239],
// 4 16 0.9239 1 -0.3827 1 1 0 1 0 0 0.9239 0 -0.3827
  [4,16,0.9239,1,-0.3827,1,1,0,1,0,0,0.9239,0,-0.3827],
// 5 24 0.9239 0 -0.3827 0.9239 1 -0.3827 1 0 0 0.7071 0 -0.7071
  [5,24,0.9239,0,-0.3827,0.9239,1,-0.3827,1,0,0,0.7071,0,-0.7071],
// 0
];
module ldraw_lib__4_4cyli(step=0, col=false, unit=2/5, alt=false, line=0.2, solid=!$preview)
    makepoly(ldraw_lib__4_4cyli(), step=step, col=col, unit=unit, alt=alt, line=line, solid=solid);
ldraw_lib__4_4cyli(line=0.2);
// main file
use <../lib.scad>
use <../p/4-4cyli.scad>
use <../p/4-4cylo.scad>
use <../p/4-4edge.scad>
use <../p/4-4ring2.scad>
use <../p/4-4ring9.scad>
use <../p/4-8sphe.scad>
function ldraw_lib__6908() = [
// 0 Dome  1 x  1 x  0.667
// 0 Name: 6908.dat
// 0 Author: Gerald Lasser [GeraldLasser]
// 0 !LDRAW_ORG Part UPDATE 2025-02
// 0 !LICENSE Licensed under CC BY 4.0 : see CAreadme.txt
// 
// 0 BFC CERTIFY CCW
  [0,"BFC","CERTIFY"],
  [0,"BFC","CCW"],
// 
// 0 !CATEGORY Sphere
// 
// 0 !HISTORY 2025-02-27 [OrionP] Official Update 2025-02
// 
// 1 16 0 0 0 3 0 0 0 -1 0 0 0 3 4-4ring2.dat
  [1,16,0,0,0,3,0,0,0,-1,0,0,0,3, ldraw_lib__4_4ring2()],
// 1 16 0 0 0 6 0 0 0 1 0 0 0 6 4-4edge.dat
  [1,16,0,0,0,6,0,0,0,1,0,0,0,6, ldraw_lib__4_4edge()],
// 0 BFC INVERTNEXT
  [0,"BFC","INVERTNEXT"],
// 1 16 0 0 0 6 0 0 0 -8 0 0 0 6 4-4cyli.dat
  [1,16,0,0,0,6,0,0,0,-8,0,0,0,6, ldraw_lib__4_4cyli()],
// 0 BFC INVERTNEXT
  [0,"BFC","INVERTNEXT"],
// 1 16 0 -8 0 6 0 0 0 -6 0 0 0 6 4-8sphe.dat
  [1,16,0,-8,0,6,0,0,0,-6,0,0,0,6, ldraw_lib__4_8sphe()],
// 
// 1 16 0 -1 0 9 0 0 0 1 0 0 0 9 4-4cylo.dat
  [1,16,0,-1,0,9,0,0,0,1,0,0,0,9, ldraw_lib__4_4cylo()],
// 1 16 0 -1 0 1 0 0 0 -1 0 0 0 1 4-4ring9.dat
  [1,16,0,-1,0,1,0,0,0,-1,0,0,0,1, ldraw_lib__4_4ring9()],
// 1 16 0 -1 0 10 0 0 0 1 0 0 0 10 4-4edge.dat
  [1,16,0,-1,0,10,0,0,0,1,0,0,0,10, ldraw_lib__4_4edge()],
// 1 16 0 -1 0 10 0 0 0 -5 0 0 0 10 4-4cyli.dat
  [1,16,0,-1,0,10,0,0,0,-5,0,0,0,10, ldraw_lib__4_4cyli()],
// 1 16 0 -6 0 10 0 0 0 -10 0 0 0 10 4-8sphe.dat
  [1,16,0,-6,0,10,0,0,0,-10,0,0,0,10, ldraw_lib__4_8sphe()],
];
module ldraw_lib__6908(step=0, col=false, unit=2/5, alt=false, line=0.2, solid=!$preview)
    makepoly(ldraw_lib__6908(), step=step, col=col, unit=unit, alt=alt, line=line, solid=solid);
ldraw_lib__6908(line=0.2);
